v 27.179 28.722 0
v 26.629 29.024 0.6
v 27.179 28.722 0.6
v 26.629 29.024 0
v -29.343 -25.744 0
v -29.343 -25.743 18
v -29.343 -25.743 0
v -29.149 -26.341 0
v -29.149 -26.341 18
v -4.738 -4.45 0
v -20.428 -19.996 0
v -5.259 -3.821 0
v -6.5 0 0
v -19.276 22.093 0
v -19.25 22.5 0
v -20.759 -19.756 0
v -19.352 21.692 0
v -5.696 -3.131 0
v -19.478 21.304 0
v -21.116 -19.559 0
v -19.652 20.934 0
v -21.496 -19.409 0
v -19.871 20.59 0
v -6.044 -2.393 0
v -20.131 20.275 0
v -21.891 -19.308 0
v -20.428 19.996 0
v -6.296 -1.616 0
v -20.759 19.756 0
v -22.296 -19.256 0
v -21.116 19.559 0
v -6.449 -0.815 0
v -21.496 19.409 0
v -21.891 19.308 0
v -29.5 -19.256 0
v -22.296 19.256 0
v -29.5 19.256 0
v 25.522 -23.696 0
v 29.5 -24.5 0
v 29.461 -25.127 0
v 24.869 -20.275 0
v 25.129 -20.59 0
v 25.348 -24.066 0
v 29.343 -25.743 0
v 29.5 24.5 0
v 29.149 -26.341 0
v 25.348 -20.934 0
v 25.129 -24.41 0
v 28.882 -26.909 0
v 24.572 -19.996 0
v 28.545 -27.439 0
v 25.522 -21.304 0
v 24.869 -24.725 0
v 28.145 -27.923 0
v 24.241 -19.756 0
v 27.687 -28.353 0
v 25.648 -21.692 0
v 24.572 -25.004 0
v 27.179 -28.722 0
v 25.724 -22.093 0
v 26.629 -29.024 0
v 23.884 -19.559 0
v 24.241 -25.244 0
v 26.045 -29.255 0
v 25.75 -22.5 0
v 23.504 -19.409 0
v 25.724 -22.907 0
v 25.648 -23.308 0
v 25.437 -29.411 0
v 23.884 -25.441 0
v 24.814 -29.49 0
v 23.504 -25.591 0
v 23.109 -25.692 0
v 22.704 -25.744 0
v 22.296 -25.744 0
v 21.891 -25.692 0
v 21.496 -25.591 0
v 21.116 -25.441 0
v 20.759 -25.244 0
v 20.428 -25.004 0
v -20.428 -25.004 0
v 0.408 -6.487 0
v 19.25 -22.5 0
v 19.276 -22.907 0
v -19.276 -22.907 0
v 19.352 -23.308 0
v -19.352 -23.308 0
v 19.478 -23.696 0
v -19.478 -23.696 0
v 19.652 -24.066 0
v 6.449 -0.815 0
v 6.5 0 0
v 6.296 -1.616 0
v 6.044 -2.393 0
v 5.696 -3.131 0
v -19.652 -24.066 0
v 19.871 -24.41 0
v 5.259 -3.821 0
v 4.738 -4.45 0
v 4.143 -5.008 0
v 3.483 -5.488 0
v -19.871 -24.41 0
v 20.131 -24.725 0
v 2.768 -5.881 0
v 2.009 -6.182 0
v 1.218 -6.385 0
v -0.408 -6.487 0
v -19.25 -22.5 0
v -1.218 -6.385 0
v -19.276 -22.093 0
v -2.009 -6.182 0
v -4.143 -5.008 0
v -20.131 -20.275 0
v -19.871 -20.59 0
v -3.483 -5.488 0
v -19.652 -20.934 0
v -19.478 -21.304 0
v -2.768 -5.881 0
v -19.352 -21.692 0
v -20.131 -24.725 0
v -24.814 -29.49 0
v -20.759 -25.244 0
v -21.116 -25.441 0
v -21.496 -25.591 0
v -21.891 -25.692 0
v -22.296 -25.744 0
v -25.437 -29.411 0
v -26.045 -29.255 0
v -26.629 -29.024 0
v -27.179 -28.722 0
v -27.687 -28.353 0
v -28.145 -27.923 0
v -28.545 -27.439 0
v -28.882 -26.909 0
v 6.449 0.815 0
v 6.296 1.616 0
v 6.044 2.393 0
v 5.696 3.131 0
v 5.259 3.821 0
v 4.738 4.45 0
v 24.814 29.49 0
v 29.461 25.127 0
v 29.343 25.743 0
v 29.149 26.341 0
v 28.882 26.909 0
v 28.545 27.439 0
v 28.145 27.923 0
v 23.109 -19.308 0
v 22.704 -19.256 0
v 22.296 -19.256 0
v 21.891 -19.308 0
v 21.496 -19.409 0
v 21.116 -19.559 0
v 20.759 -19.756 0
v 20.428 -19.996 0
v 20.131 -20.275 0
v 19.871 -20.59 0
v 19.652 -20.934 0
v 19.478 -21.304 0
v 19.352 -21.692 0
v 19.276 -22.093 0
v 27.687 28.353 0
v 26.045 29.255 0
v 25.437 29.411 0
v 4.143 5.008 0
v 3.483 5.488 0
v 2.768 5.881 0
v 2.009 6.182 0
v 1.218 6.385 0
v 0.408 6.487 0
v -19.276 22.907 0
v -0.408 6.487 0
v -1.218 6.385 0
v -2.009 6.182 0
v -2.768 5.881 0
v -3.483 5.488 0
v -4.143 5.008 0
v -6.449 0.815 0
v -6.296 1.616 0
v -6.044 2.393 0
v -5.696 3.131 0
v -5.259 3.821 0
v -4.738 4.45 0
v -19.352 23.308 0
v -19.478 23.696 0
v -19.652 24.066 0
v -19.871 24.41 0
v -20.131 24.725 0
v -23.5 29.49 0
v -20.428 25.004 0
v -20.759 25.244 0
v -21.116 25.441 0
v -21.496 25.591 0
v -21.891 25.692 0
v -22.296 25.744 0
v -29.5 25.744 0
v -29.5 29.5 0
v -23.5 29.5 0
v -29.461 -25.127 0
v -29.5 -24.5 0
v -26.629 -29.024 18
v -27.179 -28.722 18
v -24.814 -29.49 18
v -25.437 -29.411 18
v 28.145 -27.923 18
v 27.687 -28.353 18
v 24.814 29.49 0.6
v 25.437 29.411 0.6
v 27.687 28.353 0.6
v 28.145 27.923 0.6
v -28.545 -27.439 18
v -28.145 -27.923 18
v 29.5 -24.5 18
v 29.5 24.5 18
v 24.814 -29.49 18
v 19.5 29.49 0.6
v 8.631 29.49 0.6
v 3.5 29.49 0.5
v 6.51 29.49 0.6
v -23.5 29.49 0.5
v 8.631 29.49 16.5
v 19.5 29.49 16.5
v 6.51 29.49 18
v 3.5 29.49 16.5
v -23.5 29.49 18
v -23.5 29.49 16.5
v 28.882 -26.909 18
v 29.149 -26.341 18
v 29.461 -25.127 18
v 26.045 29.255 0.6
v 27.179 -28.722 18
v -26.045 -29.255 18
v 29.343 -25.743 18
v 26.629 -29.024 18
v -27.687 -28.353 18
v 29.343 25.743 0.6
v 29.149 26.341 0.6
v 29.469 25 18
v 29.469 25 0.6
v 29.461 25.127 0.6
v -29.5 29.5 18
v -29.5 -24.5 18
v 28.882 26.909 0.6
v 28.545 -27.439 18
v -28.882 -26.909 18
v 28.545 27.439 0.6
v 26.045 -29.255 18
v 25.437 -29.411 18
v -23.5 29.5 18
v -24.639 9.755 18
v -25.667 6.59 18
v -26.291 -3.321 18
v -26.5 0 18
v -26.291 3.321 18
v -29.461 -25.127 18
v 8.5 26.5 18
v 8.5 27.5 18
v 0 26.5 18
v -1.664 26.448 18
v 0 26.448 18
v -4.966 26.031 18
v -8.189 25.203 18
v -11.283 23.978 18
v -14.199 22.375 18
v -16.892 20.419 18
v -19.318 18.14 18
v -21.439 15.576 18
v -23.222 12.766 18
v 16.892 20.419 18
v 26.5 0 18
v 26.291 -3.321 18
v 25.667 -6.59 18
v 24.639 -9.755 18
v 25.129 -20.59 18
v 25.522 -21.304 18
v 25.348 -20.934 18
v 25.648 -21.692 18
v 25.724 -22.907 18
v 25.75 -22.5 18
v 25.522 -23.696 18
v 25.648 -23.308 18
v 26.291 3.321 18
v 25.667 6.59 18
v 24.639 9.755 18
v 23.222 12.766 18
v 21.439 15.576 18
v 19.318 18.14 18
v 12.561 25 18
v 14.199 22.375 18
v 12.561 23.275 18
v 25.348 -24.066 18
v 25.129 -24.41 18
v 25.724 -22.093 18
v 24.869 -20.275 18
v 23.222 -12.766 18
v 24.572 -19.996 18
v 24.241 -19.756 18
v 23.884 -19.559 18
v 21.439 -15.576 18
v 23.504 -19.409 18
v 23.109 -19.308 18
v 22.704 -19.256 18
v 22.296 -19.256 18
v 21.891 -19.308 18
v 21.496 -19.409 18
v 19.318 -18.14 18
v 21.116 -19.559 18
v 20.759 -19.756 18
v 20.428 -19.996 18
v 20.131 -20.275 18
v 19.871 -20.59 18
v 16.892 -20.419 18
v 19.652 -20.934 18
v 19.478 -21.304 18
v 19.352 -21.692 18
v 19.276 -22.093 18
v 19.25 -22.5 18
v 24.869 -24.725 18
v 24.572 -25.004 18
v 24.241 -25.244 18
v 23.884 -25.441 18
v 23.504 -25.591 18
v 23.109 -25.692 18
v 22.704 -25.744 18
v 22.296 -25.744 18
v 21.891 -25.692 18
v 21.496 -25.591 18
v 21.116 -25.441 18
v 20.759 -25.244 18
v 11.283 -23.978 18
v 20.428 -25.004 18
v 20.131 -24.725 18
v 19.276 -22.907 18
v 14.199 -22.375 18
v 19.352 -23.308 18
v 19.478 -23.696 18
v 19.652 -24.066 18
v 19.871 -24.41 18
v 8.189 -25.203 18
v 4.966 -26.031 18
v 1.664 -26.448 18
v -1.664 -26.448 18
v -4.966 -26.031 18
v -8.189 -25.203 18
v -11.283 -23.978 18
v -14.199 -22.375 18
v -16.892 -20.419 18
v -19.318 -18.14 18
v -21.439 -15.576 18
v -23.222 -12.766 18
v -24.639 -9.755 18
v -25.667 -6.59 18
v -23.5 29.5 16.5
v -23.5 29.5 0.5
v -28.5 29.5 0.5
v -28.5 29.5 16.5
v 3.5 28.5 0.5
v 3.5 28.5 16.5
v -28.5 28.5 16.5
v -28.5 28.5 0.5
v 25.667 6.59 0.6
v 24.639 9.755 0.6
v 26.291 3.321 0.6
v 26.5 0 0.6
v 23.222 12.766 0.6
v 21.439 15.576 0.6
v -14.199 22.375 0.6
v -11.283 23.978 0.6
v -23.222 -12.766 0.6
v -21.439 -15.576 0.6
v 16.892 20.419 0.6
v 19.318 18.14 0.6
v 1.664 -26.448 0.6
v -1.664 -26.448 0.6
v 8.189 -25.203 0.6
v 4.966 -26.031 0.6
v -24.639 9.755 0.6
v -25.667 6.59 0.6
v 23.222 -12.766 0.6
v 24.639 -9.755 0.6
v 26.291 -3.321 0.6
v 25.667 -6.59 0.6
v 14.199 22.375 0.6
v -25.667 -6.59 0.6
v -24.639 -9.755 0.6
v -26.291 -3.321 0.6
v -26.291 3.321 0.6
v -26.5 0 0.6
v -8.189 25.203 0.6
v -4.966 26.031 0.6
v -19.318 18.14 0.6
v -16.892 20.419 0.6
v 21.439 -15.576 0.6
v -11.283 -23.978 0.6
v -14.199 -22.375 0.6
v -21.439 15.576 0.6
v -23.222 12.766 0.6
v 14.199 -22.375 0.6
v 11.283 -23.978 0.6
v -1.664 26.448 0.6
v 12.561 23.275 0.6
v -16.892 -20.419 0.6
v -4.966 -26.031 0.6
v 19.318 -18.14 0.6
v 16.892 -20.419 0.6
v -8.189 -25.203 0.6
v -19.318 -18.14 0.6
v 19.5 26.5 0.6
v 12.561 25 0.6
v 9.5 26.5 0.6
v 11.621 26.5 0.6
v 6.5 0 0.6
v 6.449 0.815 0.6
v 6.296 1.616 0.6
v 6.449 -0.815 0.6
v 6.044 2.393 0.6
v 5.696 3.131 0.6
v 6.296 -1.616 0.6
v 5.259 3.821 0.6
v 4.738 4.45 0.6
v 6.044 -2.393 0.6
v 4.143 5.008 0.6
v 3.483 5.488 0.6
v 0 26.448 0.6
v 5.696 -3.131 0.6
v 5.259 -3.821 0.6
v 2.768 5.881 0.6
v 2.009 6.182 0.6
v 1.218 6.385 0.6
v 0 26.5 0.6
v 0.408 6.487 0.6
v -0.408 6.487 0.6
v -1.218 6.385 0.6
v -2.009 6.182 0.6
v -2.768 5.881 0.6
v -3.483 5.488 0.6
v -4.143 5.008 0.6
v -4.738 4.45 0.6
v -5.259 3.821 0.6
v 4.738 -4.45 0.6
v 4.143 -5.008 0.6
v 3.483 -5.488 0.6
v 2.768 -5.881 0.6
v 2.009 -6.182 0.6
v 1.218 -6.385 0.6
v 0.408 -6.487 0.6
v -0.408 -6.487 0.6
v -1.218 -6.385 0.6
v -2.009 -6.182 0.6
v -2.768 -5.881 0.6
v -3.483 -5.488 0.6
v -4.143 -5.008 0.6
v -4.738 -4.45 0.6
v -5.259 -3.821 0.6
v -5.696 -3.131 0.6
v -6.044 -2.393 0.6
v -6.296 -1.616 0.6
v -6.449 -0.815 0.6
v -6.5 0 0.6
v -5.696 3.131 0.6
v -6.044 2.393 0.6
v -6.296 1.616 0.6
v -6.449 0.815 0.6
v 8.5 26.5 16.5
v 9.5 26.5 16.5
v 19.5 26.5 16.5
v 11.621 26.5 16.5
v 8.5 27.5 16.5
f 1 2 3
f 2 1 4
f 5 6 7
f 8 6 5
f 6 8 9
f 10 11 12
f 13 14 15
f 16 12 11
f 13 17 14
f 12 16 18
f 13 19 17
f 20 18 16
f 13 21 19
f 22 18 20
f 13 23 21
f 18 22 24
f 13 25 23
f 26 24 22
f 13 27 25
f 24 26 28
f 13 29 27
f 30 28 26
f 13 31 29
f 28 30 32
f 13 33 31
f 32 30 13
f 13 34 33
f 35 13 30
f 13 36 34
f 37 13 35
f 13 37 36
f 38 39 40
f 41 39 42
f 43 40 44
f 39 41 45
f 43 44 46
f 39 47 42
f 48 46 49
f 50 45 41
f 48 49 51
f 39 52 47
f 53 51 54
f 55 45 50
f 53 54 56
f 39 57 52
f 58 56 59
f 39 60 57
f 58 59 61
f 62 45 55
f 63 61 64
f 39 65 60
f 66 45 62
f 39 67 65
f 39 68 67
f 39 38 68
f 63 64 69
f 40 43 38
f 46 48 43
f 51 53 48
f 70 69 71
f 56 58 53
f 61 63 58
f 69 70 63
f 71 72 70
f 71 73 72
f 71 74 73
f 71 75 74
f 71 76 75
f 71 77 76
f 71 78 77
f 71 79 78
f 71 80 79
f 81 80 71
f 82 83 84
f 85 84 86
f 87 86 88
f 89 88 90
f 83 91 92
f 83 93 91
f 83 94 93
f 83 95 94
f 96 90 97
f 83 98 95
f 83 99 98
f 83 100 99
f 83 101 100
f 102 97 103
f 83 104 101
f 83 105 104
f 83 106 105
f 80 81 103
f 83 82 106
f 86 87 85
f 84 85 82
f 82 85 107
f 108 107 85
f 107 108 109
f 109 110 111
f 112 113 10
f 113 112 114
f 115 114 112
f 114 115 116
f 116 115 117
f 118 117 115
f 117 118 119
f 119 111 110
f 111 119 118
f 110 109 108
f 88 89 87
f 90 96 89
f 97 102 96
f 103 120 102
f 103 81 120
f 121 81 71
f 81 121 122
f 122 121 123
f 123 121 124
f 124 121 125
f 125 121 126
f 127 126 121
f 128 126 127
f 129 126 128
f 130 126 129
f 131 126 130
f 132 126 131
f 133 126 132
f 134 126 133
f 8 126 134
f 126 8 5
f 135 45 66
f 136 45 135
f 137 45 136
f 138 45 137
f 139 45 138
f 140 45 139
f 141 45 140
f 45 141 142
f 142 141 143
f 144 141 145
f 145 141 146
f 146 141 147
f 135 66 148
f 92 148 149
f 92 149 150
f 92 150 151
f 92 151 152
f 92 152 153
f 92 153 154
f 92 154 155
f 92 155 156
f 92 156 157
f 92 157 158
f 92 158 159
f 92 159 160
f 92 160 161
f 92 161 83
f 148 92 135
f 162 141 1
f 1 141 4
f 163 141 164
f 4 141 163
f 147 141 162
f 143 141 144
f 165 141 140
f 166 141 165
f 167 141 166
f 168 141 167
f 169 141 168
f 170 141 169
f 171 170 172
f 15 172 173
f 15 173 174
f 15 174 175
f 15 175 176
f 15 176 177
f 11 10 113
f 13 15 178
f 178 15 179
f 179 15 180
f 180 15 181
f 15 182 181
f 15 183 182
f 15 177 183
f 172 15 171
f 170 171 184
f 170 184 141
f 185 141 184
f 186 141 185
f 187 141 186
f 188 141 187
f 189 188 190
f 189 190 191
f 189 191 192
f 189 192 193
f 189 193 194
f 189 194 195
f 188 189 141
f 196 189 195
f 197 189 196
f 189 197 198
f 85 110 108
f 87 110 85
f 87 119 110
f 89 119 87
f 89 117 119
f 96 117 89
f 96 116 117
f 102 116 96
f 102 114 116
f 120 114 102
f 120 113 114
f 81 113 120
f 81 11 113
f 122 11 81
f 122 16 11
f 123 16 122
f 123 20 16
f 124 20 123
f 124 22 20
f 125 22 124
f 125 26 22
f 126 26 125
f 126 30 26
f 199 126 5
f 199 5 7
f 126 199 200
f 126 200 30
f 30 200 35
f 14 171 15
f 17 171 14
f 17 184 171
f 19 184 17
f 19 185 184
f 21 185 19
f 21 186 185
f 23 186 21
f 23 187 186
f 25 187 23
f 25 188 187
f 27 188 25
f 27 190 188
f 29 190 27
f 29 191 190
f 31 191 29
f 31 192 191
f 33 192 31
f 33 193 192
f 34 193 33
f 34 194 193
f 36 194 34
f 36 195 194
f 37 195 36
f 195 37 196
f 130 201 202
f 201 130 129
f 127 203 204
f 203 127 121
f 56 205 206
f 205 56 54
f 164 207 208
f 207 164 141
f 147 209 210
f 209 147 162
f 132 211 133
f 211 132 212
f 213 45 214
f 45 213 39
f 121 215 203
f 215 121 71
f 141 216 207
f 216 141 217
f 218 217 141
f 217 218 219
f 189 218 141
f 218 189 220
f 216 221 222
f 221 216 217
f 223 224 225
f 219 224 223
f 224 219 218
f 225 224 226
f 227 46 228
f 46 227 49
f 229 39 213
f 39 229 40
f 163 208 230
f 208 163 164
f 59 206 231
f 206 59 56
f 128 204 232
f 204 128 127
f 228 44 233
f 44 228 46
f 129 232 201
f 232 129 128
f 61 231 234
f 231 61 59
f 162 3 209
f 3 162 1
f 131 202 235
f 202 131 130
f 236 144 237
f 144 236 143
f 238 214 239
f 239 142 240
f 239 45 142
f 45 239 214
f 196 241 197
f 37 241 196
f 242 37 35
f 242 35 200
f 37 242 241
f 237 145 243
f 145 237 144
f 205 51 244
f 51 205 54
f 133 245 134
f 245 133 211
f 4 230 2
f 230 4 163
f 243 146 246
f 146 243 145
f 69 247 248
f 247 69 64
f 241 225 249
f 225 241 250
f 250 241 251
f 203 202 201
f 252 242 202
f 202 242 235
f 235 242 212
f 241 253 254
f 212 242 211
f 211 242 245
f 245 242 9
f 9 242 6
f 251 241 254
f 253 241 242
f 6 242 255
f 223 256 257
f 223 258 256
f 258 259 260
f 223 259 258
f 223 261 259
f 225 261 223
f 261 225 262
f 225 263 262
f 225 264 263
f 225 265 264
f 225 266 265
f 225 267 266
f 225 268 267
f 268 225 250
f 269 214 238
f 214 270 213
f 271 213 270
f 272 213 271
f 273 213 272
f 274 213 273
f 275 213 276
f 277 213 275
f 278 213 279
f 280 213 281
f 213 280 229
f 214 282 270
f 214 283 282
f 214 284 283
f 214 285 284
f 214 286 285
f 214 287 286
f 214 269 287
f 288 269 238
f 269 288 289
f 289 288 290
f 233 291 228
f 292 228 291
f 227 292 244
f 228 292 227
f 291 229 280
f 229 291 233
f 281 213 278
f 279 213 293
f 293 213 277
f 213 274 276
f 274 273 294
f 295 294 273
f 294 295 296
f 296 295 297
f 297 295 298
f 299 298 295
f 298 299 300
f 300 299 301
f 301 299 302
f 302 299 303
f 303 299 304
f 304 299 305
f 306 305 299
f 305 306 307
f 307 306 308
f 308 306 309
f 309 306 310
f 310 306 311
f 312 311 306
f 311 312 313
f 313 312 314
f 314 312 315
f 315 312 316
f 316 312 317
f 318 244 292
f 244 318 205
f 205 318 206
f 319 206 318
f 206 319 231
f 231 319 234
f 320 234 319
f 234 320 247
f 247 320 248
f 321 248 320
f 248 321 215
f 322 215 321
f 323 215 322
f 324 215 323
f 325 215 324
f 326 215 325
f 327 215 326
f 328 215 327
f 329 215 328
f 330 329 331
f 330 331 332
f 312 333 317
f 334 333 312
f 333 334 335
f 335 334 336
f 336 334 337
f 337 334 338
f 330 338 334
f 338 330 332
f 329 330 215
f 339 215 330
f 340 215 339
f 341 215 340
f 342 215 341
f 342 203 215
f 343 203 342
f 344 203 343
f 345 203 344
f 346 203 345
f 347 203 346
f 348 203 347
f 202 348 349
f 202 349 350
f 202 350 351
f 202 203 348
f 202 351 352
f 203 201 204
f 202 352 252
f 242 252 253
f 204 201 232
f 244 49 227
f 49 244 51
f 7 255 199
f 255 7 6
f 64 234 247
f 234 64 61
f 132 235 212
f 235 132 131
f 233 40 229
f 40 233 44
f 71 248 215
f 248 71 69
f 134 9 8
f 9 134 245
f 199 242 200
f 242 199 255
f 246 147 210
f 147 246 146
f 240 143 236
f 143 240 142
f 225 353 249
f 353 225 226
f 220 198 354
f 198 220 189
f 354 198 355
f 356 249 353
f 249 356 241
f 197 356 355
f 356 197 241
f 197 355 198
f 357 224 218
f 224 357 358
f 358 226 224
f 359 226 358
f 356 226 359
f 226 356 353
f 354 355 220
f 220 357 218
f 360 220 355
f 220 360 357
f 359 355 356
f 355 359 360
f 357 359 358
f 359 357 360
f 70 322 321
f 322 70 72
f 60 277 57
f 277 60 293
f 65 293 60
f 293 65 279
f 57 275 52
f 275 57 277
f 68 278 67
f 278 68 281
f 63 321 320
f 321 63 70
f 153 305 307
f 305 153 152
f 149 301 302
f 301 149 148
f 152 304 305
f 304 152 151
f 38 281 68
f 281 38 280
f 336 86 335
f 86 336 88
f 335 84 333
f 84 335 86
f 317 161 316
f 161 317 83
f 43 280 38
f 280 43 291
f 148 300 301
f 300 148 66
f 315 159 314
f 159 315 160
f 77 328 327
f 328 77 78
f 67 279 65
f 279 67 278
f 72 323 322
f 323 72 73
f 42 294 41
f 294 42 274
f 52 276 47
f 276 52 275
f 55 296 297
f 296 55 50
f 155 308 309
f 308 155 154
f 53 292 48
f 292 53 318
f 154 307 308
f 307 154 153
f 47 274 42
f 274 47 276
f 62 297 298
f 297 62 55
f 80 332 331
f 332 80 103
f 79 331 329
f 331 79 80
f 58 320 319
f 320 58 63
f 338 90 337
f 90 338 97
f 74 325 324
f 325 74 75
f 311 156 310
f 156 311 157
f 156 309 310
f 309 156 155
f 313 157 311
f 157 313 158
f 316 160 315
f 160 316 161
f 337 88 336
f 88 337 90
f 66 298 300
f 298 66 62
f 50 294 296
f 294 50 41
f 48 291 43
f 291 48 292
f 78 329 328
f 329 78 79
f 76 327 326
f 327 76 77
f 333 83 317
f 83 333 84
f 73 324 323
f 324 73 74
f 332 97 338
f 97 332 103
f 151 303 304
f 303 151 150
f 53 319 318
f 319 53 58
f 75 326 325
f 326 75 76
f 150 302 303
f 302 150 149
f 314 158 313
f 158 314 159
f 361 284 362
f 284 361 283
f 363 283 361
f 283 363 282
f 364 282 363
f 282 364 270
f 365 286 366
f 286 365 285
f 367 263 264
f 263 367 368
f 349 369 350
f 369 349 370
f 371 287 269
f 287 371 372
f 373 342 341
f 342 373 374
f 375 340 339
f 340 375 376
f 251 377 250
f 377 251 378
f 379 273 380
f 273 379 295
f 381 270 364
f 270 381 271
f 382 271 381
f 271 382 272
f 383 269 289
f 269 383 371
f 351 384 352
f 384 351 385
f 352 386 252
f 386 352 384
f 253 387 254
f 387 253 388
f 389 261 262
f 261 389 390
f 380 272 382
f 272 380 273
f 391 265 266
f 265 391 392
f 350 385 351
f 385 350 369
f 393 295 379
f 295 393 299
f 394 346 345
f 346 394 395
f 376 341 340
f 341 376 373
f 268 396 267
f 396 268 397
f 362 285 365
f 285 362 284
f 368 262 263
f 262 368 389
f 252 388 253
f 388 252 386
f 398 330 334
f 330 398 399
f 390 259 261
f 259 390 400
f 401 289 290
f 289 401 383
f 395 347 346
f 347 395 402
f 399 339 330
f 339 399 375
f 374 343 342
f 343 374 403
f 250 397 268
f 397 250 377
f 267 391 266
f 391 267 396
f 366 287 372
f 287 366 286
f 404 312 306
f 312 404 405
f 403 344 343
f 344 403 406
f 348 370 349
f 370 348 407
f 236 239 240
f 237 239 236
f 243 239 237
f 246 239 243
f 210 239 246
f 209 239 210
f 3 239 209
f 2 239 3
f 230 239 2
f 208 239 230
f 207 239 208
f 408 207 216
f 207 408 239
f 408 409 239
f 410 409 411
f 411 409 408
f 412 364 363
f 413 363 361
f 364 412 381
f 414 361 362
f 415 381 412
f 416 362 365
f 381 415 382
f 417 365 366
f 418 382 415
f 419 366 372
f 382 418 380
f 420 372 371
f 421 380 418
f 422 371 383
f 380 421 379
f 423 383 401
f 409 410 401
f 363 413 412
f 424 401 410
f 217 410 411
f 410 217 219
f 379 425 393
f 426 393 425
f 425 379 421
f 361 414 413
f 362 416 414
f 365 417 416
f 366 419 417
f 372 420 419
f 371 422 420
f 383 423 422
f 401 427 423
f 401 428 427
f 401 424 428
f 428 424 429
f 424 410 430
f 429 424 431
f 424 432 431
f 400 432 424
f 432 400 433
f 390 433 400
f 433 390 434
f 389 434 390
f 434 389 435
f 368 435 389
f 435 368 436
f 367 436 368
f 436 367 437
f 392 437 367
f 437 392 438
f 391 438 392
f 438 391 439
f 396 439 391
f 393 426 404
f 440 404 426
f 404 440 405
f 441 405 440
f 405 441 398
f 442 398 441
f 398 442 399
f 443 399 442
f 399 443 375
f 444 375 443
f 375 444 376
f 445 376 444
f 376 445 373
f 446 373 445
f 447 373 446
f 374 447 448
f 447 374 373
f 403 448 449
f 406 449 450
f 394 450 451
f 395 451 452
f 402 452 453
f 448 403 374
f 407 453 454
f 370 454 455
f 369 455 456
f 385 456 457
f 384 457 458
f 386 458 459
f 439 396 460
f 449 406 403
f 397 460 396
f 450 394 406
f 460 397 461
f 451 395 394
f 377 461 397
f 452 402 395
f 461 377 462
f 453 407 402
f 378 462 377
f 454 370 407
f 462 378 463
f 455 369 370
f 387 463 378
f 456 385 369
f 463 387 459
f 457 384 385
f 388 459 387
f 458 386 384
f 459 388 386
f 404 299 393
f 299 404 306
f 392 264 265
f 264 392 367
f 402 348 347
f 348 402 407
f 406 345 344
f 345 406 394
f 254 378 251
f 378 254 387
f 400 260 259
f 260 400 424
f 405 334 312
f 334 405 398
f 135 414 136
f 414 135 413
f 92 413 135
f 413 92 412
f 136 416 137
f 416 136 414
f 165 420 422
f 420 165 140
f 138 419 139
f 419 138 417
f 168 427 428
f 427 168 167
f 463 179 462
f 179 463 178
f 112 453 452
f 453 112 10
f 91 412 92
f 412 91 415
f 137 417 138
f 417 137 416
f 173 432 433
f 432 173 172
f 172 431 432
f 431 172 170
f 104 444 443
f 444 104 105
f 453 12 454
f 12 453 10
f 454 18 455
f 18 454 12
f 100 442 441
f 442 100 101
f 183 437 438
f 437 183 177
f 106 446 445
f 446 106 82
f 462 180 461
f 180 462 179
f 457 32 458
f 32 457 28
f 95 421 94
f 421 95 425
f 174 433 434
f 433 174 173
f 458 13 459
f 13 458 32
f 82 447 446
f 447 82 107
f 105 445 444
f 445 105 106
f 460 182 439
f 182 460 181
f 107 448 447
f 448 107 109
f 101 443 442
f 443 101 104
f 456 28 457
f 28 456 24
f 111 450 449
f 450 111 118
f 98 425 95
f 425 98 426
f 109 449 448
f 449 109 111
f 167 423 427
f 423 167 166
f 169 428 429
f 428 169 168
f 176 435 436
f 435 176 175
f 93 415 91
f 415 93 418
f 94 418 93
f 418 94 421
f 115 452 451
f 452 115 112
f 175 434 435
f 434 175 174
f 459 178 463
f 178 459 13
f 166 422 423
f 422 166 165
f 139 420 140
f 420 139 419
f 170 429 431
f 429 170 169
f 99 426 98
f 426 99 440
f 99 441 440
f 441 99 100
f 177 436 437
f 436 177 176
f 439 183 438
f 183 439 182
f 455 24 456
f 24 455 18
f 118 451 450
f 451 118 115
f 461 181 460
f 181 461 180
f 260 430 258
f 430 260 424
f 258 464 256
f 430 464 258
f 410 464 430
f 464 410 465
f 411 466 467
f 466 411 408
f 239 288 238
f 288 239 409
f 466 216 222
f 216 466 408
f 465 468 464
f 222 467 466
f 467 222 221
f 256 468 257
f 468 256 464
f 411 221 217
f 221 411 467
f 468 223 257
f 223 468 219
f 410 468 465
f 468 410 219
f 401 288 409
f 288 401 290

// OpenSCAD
$fn = 50;


difference() {
	union() {
		hull() {
			translate(v = [-24.5000000000, 24.5000000000, 0]) {
				cylinder(h = 18, r = 5);
			}
			translate(v = [24.5000000000, 24.5000000000, 0]) {
				cylinder(h = 18, r = 5);
			}
			translate(v = [-24.5000000000, -24.5000000000, 0]) {
				cylinder(h = 18, r = 5);
			}
			translate(v = [24.5000000000, -24.5000000000, 0]) {
				cylinder(h = 18, r = 5);
			}
		}
		translate(v = [-29.5000000000, 23.5000000000, 0]) {
			cube(size = [6, 6, 18]);
		}
	}
	union() {
		translate(v = [-30.0000000000, -22.5000000000, -250.0000000000]) {
			rotate(a = [0, 0, 0]) {
				difference() {
					union() {
						hull() {
							translate(v = [7.5000000000, 0, 0]) {
								cylinder(h = 250, r = 3.2500000000, r1 = 3.2500000000, r2 = 3.2500000000);
							}
							translate(v = [-7.5000000000, 0, 0]) {
								cylinder(h = 250, r = 3.2500000000, r1 = 3.2500000000, r2 = 3.2500000000);
							}
						}
					}
					union();
				}
			}
		}
		translate(v = [-30.0000000000, 22.5000000000, -250.0000000000]) {
			rotate(a = [0, 0, 0]) {
				difference() {
					union() {
						hull() {
							translate(v = [7.5000000000, 0, 0]) {
								cylinder(h = 250, r = 3.2500000000, r1 = 3.2500000000, r2 = 3.2500000000);
							}
							translate(v = [-7.5000000000, 0, 0]) {
								cylinder(h = 250, r = 3.2500000000, r1 = 3.2500000000, r2 = 3.2500000000);
							}
						}
					}
					union();
				}
			}
		}
		translate(v = [-28.5000000000, 28.5000000000, 0.5000000000]) {
			cube(size = [32, 1, 16]);
		}
		translate(v = [22.5000000000, -22.5000000000, -50.0000000000]) {
			cylinder(h = 100, r = 3.2500000000);
		}
		translate(v = [0, 0, 0.6000000000]) {
			cylinder(h = 20.4000000000, r = 26.5000000000);
		}
		translate(v = [0, 0, -9.0000000000]) {
			cylinder(h = 18, r = 6.5000000000);
		}
		translate(v = [0.0000000000, 25.0000000000, 0.6000000000]) {
			cube(size = [29.5000000000, 1.5000000000, 20.4000000000]);
		}
		translate(v = [19.5000000000, 25.0000000000, 0.6000000000]) {
			cube(size = [10, 4.5000000000, 20.4000000000]);
		}
		translate(v = [8.5000000000, 25.0000000000, 16.5000000000]) {
			cube(size = [21, 4.5000000000, 1.5000000000]);
		}
		translate(v = [5.7500000000, 30.2500000000, 0.6000000000]) {
			rotate(a = [0, 0, -45]) {
				cube(size = [7.5000000000, 1.5000000000, 20.4000000000]);
			}
		}
		translate(v = [5.0610000000, 23.0000000000, 0.6000000000]) {
			cube(size = [7.5000000000, 2, 17.4000000000]);
		}
	}
}
